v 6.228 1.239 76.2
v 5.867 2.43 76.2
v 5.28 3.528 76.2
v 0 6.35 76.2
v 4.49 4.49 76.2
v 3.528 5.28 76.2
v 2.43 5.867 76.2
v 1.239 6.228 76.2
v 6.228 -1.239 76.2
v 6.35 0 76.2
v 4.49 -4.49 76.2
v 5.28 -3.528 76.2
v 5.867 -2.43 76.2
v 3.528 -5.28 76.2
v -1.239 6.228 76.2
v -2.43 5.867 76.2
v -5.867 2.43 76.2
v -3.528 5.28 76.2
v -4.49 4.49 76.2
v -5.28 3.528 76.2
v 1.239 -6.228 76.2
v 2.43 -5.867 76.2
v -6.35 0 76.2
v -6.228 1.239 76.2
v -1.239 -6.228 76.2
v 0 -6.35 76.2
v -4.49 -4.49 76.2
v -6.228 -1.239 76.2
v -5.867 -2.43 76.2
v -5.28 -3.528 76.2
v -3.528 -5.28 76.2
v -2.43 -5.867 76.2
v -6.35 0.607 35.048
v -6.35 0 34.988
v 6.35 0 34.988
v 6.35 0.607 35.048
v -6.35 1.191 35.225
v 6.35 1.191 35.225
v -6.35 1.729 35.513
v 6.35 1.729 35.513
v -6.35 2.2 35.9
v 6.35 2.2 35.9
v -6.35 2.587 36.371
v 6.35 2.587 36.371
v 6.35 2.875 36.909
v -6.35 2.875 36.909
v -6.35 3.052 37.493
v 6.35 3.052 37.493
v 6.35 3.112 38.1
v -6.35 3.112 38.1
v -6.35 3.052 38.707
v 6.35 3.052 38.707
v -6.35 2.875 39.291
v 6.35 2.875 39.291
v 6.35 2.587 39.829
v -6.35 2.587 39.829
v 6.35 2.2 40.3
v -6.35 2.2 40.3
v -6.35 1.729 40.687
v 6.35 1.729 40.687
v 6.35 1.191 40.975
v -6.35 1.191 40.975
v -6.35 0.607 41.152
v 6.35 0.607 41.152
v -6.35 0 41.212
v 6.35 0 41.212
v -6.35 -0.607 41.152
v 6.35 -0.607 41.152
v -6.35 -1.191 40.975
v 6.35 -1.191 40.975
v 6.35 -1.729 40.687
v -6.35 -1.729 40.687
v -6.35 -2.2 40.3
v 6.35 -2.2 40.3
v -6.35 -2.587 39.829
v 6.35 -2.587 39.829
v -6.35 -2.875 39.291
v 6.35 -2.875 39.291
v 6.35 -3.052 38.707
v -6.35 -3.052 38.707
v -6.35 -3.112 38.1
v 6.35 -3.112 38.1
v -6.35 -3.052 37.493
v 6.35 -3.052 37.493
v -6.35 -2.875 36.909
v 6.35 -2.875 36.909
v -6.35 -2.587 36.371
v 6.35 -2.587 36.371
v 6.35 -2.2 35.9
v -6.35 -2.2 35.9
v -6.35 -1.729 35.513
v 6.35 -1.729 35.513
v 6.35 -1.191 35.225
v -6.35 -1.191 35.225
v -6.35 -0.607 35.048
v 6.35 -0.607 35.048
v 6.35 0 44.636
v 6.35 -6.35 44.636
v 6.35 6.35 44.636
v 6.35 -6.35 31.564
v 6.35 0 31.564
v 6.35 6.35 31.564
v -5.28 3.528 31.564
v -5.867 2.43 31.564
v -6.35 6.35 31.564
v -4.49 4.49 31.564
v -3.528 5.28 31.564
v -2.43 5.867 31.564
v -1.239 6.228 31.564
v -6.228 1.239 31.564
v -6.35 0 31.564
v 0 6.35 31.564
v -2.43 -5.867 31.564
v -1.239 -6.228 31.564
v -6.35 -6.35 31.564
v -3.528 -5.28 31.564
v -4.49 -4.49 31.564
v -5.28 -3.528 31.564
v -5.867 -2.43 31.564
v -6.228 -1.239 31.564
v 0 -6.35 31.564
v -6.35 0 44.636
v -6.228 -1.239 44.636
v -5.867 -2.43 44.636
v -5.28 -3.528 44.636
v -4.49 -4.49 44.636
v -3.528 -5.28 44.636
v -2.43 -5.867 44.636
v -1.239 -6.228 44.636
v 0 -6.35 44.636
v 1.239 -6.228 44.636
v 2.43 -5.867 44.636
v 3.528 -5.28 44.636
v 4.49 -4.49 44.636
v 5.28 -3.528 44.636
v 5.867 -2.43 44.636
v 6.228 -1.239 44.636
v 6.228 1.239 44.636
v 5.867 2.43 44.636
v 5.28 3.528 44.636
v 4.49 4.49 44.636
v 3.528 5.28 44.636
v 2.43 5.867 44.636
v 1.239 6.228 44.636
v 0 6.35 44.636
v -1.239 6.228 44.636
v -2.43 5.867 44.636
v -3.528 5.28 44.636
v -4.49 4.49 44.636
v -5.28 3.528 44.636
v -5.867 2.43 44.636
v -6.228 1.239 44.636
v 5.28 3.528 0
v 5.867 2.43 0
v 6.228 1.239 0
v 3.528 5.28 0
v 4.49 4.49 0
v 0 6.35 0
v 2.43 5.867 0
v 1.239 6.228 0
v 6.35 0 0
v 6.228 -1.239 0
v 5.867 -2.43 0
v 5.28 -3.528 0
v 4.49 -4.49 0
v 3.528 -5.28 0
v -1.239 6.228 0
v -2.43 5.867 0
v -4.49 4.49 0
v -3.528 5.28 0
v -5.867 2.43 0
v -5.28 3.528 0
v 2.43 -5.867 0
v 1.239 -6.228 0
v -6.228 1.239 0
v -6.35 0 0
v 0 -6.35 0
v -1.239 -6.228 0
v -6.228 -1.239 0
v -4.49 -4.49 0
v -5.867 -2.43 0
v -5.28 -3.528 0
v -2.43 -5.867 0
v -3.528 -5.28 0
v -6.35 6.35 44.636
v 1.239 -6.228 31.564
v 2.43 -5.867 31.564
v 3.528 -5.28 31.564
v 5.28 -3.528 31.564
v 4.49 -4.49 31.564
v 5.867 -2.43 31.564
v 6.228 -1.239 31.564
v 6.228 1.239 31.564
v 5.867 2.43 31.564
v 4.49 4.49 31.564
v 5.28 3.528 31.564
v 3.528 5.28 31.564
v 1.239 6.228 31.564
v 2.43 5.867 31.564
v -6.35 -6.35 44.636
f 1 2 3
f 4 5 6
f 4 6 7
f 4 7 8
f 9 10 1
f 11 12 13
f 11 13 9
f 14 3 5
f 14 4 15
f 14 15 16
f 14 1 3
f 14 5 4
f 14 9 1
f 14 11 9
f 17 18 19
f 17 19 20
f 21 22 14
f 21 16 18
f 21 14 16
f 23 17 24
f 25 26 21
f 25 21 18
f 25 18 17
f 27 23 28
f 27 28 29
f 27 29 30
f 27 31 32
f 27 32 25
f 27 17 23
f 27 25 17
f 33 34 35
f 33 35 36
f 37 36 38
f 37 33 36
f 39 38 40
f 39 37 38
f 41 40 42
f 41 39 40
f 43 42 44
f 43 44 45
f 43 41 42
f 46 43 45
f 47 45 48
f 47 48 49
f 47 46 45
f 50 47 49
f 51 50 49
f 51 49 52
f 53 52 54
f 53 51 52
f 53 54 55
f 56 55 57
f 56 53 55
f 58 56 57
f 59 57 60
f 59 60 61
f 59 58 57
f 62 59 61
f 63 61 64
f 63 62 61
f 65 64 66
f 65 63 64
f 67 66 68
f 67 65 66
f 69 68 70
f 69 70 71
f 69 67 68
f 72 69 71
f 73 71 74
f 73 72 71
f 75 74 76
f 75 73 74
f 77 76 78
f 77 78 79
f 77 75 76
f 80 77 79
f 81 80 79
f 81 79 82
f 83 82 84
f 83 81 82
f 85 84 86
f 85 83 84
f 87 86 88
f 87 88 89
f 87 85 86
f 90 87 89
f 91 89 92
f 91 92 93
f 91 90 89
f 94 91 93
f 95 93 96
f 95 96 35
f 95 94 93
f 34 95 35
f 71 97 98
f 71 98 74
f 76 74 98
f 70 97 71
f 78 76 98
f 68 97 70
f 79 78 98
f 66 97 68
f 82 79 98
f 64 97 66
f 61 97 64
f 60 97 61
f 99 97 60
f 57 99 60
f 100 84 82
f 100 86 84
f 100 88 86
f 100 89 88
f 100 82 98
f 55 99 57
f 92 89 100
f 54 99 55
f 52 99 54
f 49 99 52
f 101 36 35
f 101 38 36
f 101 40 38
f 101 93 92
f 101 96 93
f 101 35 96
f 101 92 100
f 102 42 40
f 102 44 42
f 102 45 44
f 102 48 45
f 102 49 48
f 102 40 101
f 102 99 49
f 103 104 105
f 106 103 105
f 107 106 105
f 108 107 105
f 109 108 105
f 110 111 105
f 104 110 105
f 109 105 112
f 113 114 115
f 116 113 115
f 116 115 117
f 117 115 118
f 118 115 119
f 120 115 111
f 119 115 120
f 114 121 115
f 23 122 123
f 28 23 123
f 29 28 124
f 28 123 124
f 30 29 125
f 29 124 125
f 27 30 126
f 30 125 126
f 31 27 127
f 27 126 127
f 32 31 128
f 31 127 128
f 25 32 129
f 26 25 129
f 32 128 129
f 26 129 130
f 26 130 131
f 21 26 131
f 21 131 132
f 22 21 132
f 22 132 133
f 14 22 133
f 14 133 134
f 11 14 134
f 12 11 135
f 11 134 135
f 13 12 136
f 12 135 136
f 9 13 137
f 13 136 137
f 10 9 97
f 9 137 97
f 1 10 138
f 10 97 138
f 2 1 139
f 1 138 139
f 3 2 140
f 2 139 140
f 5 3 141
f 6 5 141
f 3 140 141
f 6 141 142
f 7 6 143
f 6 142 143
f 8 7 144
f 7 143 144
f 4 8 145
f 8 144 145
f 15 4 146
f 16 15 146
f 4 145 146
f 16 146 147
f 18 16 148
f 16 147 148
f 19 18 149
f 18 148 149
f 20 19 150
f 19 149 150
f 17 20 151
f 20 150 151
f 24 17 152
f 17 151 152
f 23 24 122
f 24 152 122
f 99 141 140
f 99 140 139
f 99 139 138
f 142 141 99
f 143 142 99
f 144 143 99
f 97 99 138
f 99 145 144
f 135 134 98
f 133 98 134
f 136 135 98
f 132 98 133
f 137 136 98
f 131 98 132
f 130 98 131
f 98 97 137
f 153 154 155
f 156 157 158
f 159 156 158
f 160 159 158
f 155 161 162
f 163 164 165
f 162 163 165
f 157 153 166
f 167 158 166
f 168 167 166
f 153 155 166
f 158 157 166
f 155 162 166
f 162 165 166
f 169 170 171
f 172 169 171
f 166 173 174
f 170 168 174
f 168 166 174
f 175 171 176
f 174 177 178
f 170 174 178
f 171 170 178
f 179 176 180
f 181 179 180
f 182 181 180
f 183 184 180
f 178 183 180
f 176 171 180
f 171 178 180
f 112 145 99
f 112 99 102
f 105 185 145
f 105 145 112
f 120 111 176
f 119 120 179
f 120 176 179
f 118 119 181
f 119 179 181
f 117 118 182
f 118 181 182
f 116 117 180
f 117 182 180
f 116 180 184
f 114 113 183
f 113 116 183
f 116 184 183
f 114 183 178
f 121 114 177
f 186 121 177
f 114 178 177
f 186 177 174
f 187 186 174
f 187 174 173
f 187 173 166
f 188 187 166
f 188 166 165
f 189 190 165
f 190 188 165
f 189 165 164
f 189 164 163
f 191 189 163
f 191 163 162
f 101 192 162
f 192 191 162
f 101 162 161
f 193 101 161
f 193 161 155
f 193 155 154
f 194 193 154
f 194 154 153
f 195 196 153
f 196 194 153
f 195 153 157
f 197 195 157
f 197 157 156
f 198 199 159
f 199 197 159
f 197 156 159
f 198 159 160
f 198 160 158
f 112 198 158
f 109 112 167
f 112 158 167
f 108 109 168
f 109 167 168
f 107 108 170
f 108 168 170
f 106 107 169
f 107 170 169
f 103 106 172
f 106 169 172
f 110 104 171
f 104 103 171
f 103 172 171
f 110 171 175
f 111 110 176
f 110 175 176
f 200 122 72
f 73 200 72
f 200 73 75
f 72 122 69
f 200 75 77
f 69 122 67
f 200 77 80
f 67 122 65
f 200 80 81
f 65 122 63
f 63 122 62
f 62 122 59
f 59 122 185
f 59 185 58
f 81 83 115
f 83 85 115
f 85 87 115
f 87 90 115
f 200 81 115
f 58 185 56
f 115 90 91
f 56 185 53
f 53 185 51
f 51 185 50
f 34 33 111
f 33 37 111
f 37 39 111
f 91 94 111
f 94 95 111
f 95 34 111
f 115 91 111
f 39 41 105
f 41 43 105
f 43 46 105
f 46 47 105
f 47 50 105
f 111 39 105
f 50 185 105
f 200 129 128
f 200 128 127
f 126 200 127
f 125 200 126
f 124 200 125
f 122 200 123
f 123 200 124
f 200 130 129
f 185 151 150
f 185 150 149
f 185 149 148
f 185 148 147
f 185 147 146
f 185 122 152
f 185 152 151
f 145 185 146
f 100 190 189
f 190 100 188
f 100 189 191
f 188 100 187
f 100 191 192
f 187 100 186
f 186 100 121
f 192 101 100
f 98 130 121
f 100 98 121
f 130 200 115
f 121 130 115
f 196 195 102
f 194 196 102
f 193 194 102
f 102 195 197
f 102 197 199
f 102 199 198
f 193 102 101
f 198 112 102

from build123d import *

# Parameters (mm, degrees)
SKETCH1_R                = 6.35
BOSS_EXTRUDE1_DEPTH      = 76.2
BOSS_EXTRUDE2_DEPTH      = 6.35
BOSS_EXTRUDE2_DEPTH_BACK = 6.35
SKETCH2_W                = 13.071299085
SKETCH2_H                = 12.7
CUT_EXTRUDE1_DEPTH       = 6.35
CUT_EXTRUDE1_DEPTH_BACK  = 6.35
SKETCH3_R                = 3.1115


with BuildPart() as part:
    # Sketch1 → Boss-Extrude1 (new body)
    with BuildSketch(Plane.XY):
        Circle(SKETCH1_R)
    extrude(amount=BOSS_EXTRUDE1_DEPTH)

    # Sketch2 → Boss-Extrude2 (add, two sides: drawn at the far end of the back side and taken through both)
    with BuildSketch(Plane(origin=(0, 0, 0), x_dir=(0, 0, -1), z_dir=(1, 0, 0)).offset(-BOSS_EXTRUDE2_DEPTH_BACK)):
        with Locations((-38.10000004, 0)):
            Rectangle(SKETCH2_W, SKETCH2_H)
    extrude(amount=BOSS_EXTRUDE2_DEPTH + BOSS_EXTRUDE2_DEPTH_BACK)

    # Sketch3 → Cut-Extrude1 (cut, two sides: drawn at the far end of the back side and taken through both)
    with BuildSketch(Plane(origin=(0, 0, 0), x_dir=(0, 0, -1), z_dir=(1, 0, 0)).offset(-CUT_EXTRUDE1_DEPTH_BACK)):
        with Locations((-38.1, 0)):
            Circle(SKETCH3_R)
    extrude(amount=CUT_EXTRUDE1_DEPTH + CUT_EXTRUDE1_DEPTH_BACK, mode=Mode.SUBTRACT)


solid = part.part
